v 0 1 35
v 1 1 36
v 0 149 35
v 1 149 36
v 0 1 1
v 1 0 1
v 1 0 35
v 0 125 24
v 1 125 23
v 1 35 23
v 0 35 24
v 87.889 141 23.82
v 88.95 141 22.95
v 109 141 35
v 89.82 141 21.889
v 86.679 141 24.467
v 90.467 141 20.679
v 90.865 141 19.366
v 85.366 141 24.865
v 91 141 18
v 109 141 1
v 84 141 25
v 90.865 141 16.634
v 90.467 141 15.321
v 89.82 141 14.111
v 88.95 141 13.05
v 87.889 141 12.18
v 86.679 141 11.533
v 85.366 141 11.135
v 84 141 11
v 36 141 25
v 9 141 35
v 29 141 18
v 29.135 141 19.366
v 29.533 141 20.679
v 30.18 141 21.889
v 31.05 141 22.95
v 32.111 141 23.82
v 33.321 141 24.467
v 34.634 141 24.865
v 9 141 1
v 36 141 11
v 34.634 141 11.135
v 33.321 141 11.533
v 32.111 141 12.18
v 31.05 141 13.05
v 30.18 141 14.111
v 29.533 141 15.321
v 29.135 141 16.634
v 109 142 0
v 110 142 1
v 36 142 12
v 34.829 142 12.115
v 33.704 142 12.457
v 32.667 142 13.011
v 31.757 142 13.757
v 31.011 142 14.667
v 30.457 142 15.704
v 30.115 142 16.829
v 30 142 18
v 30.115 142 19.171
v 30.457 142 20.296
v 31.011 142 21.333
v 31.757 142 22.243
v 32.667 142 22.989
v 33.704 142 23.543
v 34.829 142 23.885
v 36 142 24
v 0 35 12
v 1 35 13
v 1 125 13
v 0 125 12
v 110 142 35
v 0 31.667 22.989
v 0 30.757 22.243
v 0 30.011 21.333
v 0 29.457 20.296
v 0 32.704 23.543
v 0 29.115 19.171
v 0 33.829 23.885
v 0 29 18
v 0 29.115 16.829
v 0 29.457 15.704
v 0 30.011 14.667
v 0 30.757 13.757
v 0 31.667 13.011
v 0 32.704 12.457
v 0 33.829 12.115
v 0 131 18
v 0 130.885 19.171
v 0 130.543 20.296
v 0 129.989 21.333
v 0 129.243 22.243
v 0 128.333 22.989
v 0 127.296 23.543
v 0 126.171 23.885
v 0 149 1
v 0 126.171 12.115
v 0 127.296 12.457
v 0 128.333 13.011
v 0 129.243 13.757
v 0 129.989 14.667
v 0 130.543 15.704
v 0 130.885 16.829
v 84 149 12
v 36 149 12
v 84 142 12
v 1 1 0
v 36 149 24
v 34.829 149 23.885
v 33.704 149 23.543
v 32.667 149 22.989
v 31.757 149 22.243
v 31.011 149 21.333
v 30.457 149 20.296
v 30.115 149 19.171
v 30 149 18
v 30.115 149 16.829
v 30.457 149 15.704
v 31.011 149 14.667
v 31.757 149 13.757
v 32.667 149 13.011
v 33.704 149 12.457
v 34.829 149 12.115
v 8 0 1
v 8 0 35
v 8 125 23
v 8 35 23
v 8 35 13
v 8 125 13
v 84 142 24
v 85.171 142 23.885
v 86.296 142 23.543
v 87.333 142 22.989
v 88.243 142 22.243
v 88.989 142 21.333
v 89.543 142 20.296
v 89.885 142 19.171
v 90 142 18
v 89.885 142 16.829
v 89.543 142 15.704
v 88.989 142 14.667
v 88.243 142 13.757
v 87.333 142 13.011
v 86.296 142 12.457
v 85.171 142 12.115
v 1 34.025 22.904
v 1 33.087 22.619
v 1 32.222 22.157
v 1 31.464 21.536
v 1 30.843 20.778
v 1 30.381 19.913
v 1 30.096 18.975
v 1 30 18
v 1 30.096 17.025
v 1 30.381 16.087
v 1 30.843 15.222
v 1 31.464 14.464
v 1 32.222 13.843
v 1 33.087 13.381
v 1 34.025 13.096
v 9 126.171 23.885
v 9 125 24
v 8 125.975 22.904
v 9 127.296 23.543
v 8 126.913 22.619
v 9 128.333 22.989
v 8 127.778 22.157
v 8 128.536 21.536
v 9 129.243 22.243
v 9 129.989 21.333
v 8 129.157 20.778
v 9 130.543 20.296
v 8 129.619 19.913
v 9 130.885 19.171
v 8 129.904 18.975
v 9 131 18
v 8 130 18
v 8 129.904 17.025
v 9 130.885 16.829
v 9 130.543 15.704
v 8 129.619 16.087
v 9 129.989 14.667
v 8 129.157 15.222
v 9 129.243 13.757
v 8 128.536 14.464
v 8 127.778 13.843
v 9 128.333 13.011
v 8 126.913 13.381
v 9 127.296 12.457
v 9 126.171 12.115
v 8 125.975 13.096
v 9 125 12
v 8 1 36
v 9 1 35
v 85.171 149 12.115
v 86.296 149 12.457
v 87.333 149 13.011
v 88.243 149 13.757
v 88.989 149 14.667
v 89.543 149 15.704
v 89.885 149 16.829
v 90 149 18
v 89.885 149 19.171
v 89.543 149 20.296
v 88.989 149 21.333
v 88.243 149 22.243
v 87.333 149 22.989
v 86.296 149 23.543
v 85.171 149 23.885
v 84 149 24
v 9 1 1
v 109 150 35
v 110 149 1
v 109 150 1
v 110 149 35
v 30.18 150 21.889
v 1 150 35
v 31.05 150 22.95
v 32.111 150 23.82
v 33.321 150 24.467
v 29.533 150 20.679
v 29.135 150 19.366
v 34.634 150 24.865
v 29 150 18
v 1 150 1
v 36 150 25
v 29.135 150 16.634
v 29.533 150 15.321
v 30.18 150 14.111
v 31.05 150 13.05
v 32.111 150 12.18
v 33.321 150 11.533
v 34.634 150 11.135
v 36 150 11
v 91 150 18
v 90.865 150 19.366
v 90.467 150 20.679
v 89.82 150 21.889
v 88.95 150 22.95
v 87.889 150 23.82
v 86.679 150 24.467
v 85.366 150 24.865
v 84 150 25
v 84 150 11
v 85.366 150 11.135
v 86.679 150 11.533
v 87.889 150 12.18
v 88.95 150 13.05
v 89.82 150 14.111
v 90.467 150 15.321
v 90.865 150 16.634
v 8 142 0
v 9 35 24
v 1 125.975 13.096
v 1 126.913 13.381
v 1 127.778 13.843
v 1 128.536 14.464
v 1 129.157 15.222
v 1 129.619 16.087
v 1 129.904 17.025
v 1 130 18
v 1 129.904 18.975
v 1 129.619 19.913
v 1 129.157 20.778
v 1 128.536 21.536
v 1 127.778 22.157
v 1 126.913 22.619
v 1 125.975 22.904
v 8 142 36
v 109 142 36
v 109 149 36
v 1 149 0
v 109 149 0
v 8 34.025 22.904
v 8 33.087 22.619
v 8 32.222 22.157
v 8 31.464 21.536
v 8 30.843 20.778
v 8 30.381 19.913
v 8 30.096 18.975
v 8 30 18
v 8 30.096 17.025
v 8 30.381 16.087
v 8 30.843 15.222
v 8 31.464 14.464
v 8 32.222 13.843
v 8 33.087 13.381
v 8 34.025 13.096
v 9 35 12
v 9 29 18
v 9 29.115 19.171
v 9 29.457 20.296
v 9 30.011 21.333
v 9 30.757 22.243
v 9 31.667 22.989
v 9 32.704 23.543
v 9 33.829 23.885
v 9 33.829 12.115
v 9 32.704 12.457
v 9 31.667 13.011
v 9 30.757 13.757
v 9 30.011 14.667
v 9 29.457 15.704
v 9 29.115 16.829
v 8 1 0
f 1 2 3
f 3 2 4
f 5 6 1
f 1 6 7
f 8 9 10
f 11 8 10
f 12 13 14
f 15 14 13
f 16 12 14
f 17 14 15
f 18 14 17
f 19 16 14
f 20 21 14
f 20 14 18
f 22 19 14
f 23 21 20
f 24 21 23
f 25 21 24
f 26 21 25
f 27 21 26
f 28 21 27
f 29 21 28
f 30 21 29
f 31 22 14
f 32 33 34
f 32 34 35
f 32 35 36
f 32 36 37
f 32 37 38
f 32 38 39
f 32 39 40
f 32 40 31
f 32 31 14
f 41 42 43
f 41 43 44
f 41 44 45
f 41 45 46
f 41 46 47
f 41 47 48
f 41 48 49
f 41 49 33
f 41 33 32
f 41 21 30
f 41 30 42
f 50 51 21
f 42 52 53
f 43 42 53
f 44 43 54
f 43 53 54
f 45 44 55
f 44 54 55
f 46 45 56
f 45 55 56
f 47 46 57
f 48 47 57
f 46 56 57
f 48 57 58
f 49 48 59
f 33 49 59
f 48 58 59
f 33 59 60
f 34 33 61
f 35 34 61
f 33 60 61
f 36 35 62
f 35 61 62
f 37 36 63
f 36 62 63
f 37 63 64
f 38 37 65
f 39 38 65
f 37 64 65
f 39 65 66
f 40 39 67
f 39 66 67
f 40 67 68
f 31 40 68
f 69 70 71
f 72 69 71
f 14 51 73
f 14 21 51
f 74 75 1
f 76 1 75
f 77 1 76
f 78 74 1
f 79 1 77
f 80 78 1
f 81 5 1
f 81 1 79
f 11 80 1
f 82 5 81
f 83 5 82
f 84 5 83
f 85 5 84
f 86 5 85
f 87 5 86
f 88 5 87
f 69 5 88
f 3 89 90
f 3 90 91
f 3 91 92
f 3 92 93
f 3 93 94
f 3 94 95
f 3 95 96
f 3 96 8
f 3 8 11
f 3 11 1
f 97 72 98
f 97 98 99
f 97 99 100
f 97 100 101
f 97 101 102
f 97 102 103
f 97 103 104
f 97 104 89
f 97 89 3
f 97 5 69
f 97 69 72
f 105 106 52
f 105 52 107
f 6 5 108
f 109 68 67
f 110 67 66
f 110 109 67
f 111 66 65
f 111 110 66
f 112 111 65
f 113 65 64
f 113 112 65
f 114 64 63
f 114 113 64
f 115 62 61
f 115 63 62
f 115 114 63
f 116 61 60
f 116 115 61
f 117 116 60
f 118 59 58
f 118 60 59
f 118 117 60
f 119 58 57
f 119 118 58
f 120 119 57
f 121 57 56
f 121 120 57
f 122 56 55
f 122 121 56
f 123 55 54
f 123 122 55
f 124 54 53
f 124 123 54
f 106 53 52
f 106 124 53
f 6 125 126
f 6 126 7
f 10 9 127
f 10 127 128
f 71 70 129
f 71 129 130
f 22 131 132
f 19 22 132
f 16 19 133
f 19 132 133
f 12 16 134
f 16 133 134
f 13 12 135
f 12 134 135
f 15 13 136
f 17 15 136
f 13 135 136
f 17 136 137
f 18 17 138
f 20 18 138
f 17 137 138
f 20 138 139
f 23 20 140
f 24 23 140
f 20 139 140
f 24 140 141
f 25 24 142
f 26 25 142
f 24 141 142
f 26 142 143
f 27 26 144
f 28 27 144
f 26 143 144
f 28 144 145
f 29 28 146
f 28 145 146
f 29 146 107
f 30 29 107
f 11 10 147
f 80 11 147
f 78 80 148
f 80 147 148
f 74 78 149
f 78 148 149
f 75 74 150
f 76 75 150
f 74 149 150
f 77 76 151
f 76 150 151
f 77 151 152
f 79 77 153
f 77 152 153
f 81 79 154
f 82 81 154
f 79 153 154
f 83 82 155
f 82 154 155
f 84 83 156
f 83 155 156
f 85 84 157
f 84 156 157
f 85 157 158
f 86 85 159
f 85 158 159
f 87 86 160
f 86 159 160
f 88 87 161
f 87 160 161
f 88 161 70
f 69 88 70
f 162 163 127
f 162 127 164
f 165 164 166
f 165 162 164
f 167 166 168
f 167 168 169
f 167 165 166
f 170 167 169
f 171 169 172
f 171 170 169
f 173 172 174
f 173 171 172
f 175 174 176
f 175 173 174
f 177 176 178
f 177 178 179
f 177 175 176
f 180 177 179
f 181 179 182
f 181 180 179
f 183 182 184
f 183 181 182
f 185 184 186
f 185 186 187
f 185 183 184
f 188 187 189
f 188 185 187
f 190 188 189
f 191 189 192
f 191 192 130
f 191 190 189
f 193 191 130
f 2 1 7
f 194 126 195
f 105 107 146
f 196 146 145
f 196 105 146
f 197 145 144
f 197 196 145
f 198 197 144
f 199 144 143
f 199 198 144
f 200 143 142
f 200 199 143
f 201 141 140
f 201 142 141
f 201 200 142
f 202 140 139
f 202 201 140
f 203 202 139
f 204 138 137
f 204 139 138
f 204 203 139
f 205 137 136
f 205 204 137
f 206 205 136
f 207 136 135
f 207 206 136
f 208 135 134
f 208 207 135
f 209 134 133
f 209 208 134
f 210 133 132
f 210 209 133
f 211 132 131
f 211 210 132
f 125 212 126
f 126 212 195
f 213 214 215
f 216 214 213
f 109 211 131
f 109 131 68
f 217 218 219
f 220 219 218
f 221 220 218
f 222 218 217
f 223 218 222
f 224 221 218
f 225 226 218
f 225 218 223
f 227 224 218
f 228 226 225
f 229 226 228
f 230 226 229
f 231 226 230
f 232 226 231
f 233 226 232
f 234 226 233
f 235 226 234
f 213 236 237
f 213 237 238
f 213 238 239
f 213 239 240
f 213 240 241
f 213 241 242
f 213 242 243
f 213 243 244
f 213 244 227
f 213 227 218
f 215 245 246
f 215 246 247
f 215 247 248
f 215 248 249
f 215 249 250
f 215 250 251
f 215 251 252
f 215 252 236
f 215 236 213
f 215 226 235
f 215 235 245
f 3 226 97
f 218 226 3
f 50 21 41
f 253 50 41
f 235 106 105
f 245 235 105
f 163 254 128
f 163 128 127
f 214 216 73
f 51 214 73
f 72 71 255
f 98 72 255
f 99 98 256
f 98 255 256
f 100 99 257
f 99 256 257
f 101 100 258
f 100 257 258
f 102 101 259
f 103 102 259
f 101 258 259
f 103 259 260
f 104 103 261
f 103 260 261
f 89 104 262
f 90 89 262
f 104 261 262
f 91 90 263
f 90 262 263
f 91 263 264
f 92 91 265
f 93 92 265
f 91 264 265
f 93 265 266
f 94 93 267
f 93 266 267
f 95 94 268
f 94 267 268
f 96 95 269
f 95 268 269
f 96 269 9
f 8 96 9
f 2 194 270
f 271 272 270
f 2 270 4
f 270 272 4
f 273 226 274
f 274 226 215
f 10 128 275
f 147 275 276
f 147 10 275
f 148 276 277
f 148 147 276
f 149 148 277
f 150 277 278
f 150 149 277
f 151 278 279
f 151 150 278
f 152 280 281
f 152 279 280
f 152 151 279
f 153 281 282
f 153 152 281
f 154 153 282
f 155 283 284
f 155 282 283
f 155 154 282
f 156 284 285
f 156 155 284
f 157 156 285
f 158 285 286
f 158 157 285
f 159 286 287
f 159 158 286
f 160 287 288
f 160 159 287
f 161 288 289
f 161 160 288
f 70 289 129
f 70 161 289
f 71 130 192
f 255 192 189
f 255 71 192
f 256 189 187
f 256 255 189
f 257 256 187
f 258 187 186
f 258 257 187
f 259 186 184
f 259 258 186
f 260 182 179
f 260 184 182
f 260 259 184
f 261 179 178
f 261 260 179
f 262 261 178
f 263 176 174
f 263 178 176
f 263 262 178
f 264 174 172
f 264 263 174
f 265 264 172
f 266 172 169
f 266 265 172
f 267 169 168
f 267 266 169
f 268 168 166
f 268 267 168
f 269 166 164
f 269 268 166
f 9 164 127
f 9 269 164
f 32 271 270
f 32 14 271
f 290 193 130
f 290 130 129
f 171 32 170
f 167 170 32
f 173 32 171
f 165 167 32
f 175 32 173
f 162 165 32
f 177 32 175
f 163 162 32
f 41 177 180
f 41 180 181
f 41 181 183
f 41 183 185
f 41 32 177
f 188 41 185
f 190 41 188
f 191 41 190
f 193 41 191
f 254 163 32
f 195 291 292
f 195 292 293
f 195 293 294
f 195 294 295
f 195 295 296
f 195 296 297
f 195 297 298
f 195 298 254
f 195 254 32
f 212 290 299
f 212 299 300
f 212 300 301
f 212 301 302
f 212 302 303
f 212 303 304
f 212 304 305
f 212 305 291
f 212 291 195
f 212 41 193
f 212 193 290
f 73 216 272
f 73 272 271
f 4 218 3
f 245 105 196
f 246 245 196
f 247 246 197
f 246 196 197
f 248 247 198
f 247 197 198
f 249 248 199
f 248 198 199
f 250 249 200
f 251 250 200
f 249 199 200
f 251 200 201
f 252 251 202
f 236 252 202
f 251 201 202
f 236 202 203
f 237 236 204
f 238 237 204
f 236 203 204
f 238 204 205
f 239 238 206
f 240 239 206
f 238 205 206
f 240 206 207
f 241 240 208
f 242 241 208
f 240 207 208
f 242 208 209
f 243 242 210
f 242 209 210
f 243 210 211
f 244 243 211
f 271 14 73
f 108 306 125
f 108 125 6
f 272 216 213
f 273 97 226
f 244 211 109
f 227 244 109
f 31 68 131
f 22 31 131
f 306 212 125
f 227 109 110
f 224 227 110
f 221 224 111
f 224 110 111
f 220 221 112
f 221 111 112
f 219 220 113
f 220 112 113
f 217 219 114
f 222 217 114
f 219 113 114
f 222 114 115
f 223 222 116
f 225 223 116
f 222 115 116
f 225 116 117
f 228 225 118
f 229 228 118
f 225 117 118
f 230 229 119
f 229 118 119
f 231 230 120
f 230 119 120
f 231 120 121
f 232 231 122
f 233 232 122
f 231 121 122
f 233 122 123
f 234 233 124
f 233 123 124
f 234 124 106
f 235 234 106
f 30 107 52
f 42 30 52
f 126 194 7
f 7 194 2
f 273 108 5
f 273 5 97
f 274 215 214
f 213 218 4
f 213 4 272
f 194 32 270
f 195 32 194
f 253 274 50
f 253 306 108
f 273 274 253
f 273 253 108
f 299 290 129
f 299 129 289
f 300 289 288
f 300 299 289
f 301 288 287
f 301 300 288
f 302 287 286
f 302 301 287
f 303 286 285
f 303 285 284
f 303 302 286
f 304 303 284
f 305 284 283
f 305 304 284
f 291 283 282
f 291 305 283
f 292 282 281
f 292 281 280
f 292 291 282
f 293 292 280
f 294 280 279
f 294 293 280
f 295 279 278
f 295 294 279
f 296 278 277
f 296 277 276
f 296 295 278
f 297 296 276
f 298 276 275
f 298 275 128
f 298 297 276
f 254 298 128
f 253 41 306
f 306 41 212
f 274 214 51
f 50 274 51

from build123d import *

# Parameters (mm, degrees)
BOSS_EXTRU_1_DEPTH      = 36
ENL_V_MAT_EXTRU_1_DEPTH = 36
ENL_V_MAT_EXTRU_2_DEPTH = 36
CHANFREIN1_SIZE         = 1


with BuildPart() as part:
    # Esquisse1 → Boss.-Extru.1 (new body)
    with BuildSketch(Plane.XY):
        Polygon((0, 0), (0, 150), (110, 150), (110, 141), (9, 141), (9, 0), align=None)
    extrude(amount=BOSS_EXTRU_1_DEPTH)

    # Esquisse2 → Enlèv. mat.-Extru.1 (cut)
    with BuildSketch(Plane.ZY):
        with BuildLine():
            Line((23, 125), (23, 35))
            ThreePointArc((23, 35), (18, 30), (13, 35))
            Line((13, 35), (13, 125))
            ThreePointArc((13, 125), (18, 130), (23, 125))
        make_face()
    extrude(amount=-ENL_V_MAT_EXTRU_1_DEPTH, mode=Mode.SUBTRACT)

    # Esquisse3 → Enlèv. mat.-Extru.2 (cut)
    with BuildSketch(Plane(origin=(0, 150, 0), x_dir=(1, 0, 0), z_dir=(0, 1, 0))):
        with BuildLine():
            Line((36, -12), (84, -12))
            ThreePointArc((84, -12), (90, -18), (84, -24))
            Line((84, -24), (36, -24))
            ThreePointArc((36, -24), (30, -18), (36, -12))
        make_face()
    extrude(amount=-ENL_V_MAT_EXTRU_2_DEPTH, mode=Mode.SUBTRACT)

    # Chanfrein1
    chanfrein1_edges = [part.edges().sort_by_distance(p)[0] for p in [
        (59.5, 141, 36),
        (0, 0, 18),
        (0, 150, 18),
        (110, 150, 18),
        (110, 141, 18),
        (9, 0, 18),
        (110, 145.5, 36),
        (55, 150, 36),
        (0, 75, 36),
        (9, 130, 18),
        (9, 80, 23),
        (9, 30, 18),
        (9, 80, 13),
        (0, 130, 18),
        (0, 80, 13),
        (0, 30, 18),
        (0, 80, 23),
        (4.5, 0, 36),
        (30, 141, 18),
        (60, 141, 12),
        (90, 141, 18),
        (60, 141, 24),
        (30, 150, 18),
        (60, 150, 24),
        (90, 150, 18),
        (60, 150, 12),
        (0, 75, 0),
        (55, 150, 0),
        (110, 145.5, 0),
        (9, 70.5, 36),
        (59.5, 141, 0),
        (9, 70.5, 0),
        (4.5, 0, 0),
    ]]
    chamfer(chanfrein1_edges, length=CHANFREIN1_SIZE)


solid = part.part
